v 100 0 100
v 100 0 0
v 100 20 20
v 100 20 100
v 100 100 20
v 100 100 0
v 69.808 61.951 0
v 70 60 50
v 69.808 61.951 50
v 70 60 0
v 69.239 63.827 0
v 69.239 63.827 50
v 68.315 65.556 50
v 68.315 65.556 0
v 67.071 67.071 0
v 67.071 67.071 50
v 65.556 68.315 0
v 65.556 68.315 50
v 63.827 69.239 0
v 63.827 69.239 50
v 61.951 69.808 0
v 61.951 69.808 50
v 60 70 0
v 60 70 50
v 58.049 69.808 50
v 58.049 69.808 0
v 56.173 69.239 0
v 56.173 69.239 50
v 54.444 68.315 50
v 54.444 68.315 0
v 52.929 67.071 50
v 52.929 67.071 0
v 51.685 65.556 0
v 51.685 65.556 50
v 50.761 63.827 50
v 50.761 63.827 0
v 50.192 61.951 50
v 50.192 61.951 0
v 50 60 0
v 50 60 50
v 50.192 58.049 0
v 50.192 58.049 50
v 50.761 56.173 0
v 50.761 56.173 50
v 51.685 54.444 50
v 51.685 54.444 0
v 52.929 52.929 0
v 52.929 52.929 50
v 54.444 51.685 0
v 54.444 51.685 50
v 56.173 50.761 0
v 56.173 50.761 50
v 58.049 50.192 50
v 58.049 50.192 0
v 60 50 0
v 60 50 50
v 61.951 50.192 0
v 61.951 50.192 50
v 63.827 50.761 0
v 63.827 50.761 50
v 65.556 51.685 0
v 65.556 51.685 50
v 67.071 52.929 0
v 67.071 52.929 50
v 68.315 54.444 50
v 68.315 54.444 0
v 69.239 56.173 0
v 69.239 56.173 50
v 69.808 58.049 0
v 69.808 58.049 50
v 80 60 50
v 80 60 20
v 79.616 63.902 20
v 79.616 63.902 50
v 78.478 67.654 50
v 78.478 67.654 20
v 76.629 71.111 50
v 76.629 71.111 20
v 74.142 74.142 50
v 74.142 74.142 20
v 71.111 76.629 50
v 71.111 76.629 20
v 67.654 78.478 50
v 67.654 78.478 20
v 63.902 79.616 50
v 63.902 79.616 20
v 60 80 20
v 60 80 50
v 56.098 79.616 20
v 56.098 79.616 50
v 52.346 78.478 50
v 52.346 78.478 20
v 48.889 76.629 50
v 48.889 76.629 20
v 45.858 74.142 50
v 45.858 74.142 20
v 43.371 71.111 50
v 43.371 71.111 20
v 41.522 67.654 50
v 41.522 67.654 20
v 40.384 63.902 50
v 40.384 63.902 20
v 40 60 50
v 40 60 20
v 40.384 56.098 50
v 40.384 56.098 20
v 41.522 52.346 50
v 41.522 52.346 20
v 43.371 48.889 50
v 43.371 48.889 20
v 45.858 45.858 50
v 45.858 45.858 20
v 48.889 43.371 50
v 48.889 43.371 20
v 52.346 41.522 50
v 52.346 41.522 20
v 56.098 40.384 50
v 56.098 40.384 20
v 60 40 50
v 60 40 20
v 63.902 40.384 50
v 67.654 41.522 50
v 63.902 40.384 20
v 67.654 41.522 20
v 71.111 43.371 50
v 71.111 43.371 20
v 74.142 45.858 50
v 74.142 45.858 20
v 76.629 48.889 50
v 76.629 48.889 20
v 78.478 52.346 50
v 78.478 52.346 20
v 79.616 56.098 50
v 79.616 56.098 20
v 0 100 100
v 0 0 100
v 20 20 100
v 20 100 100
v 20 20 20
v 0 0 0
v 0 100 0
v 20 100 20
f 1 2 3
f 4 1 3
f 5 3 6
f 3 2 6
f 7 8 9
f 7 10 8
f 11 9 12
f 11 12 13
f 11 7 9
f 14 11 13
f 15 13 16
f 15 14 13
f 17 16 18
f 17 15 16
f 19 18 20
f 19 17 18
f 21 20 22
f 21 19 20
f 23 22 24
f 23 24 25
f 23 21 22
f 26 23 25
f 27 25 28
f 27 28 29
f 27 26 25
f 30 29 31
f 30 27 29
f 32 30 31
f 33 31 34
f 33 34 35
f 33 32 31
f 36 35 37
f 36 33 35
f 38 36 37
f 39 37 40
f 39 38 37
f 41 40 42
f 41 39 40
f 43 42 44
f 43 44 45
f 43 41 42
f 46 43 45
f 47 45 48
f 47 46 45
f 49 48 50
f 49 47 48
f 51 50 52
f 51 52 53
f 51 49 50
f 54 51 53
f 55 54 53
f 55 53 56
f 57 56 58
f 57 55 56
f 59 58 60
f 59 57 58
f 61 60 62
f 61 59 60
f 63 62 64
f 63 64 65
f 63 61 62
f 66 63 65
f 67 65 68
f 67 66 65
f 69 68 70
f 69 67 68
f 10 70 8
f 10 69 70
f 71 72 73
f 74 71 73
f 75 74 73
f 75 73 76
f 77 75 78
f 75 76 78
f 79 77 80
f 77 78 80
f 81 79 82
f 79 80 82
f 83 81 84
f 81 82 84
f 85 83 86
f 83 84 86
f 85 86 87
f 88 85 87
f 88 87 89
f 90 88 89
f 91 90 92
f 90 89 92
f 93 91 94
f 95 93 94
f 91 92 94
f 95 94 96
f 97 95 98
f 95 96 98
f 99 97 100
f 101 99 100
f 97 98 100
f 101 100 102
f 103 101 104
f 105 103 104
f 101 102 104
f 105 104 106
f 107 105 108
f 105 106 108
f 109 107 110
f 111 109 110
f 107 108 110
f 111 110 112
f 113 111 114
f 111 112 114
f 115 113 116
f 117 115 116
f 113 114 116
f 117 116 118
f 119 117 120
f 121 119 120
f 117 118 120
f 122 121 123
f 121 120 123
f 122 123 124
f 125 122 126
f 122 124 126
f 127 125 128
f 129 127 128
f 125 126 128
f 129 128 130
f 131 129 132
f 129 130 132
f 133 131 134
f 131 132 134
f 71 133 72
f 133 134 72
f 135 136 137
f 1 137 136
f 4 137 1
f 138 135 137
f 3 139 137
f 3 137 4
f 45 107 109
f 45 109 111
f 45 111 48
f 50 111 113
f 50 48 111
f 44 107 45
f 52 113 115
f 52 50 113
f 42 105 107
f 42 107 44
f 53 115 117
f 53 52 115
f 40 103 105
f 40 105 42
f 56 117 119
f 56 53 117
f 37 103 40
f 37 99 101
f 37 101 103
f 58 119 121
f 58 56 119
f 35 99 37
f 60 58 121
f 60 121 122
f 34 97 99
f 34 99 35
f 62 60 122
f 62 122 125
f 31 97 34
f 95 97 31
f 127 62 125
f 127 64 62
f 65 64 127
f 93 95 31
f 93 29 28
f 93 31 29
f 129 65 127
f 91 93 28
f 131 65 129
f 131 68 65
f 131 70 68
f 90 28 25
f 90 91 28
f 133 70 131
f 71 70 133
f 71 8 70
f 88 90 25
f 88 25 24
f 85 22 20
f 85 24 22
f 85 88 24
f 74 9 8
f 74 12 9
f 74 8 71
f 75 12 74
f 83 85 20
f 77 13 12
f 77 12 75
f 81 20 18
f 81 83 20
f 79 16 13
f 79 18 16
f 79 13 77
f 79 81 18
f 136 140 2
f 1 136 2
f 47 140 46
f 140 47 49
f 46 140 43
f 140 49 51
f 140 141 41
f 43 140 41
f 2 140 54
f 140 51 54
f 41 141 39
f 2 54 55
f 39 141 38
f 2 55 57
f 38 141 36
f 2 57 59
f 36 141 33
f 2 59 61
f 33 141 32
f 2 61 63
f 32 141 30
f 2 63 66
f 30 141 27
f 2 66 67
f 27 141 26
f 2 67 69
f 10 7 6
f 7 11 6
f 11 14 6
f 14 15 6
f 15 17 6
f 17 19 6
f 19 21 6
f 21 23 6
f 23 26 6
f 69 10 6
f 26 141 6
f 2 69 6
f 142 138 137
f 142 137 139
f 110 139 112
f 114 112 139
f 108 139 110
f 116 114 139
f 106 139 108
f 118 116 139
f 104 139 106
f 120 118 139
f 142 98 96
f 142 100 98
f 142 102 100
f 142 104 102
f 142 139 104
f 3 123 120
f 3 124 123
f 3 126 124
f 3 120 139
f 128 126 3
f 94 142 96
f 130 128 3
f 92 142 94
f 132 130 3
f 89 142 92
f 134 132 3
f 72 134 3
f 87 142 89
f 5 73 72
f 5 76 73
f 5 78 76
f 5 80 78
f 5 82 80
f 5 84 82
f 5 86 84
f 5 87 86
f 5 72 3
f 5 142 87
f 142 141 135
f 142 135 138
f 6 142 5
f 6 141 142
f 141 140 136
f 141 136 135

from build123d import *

# Parameters (mm, degrees)
SKETCH1_W           = 100
SKETCH1_H           = 100
BOSS_EXTRUDE1_DEPTH = 100
SKETCH2_W           = 80
SKETCH2_H           = 80
CUT_EXTRUDE1_DEPTH  = 80
SKETCH3_R           = 10
CUT_EXTRUDE2_DEPTH  = 20
BOSS_EXTRUDE3_START = 30
SKETCH3_5_R         = 20
SKETCH3_5_R_2       = 10
BOSS_EXTRUDE3_DEPTH = 30


with BuildPart() as part:
    # Sketch1 → Boss-Extrude1 (new body)
    with BuildSketch(Plane.XY):
        with Locations((50, 50)):
            Rectangle(SKETCH1_W, SKETCH1_H)
    extrude(amount=BOSS_EXTRUDE1_DEPTH)

    # Sketch2 → Cut-Extrude1 (cut)
    with BuildSketch(Plane(origin=(0, 100, 0), x_dir=(1, 0, 0), z_dir=(0, 1, 0))):
        with Locations((60, -60)):
            Rectangle(SKETCH2_W, SKETCH2_H)
    extrude(amount=-CUT_EXTRUDE1_DEPTH, mode=Mode.SUBTRACT)

    # Sketch3 → Cut-Extrude2 (cut)
    with BuildSketch(Plane.XY.offset(20)):
        with Locations((60, 60)):
            Circle(SKETCH3_R)
    extrude(amount=-CUT_EXTRUDE2_DEPTH, mode=Mode.SUBTRACT)

    # Sketch3_5 → Boss-Extrude3 (add)
    with BuildSketch(Plane.XY.offset(20).offset(BOSS_EXTRUDE3_START)):
        with Locations((60, 60)):
            Circle(SKETCH3_5_R)
        with Locations((60, 60)):
            Circle(SKETCH3_5_R_2, mode=Mode.SUBTRACT)
    extrude(amount=-BOSS_EXTRUDE3_DEPTH)


solid = part.part
